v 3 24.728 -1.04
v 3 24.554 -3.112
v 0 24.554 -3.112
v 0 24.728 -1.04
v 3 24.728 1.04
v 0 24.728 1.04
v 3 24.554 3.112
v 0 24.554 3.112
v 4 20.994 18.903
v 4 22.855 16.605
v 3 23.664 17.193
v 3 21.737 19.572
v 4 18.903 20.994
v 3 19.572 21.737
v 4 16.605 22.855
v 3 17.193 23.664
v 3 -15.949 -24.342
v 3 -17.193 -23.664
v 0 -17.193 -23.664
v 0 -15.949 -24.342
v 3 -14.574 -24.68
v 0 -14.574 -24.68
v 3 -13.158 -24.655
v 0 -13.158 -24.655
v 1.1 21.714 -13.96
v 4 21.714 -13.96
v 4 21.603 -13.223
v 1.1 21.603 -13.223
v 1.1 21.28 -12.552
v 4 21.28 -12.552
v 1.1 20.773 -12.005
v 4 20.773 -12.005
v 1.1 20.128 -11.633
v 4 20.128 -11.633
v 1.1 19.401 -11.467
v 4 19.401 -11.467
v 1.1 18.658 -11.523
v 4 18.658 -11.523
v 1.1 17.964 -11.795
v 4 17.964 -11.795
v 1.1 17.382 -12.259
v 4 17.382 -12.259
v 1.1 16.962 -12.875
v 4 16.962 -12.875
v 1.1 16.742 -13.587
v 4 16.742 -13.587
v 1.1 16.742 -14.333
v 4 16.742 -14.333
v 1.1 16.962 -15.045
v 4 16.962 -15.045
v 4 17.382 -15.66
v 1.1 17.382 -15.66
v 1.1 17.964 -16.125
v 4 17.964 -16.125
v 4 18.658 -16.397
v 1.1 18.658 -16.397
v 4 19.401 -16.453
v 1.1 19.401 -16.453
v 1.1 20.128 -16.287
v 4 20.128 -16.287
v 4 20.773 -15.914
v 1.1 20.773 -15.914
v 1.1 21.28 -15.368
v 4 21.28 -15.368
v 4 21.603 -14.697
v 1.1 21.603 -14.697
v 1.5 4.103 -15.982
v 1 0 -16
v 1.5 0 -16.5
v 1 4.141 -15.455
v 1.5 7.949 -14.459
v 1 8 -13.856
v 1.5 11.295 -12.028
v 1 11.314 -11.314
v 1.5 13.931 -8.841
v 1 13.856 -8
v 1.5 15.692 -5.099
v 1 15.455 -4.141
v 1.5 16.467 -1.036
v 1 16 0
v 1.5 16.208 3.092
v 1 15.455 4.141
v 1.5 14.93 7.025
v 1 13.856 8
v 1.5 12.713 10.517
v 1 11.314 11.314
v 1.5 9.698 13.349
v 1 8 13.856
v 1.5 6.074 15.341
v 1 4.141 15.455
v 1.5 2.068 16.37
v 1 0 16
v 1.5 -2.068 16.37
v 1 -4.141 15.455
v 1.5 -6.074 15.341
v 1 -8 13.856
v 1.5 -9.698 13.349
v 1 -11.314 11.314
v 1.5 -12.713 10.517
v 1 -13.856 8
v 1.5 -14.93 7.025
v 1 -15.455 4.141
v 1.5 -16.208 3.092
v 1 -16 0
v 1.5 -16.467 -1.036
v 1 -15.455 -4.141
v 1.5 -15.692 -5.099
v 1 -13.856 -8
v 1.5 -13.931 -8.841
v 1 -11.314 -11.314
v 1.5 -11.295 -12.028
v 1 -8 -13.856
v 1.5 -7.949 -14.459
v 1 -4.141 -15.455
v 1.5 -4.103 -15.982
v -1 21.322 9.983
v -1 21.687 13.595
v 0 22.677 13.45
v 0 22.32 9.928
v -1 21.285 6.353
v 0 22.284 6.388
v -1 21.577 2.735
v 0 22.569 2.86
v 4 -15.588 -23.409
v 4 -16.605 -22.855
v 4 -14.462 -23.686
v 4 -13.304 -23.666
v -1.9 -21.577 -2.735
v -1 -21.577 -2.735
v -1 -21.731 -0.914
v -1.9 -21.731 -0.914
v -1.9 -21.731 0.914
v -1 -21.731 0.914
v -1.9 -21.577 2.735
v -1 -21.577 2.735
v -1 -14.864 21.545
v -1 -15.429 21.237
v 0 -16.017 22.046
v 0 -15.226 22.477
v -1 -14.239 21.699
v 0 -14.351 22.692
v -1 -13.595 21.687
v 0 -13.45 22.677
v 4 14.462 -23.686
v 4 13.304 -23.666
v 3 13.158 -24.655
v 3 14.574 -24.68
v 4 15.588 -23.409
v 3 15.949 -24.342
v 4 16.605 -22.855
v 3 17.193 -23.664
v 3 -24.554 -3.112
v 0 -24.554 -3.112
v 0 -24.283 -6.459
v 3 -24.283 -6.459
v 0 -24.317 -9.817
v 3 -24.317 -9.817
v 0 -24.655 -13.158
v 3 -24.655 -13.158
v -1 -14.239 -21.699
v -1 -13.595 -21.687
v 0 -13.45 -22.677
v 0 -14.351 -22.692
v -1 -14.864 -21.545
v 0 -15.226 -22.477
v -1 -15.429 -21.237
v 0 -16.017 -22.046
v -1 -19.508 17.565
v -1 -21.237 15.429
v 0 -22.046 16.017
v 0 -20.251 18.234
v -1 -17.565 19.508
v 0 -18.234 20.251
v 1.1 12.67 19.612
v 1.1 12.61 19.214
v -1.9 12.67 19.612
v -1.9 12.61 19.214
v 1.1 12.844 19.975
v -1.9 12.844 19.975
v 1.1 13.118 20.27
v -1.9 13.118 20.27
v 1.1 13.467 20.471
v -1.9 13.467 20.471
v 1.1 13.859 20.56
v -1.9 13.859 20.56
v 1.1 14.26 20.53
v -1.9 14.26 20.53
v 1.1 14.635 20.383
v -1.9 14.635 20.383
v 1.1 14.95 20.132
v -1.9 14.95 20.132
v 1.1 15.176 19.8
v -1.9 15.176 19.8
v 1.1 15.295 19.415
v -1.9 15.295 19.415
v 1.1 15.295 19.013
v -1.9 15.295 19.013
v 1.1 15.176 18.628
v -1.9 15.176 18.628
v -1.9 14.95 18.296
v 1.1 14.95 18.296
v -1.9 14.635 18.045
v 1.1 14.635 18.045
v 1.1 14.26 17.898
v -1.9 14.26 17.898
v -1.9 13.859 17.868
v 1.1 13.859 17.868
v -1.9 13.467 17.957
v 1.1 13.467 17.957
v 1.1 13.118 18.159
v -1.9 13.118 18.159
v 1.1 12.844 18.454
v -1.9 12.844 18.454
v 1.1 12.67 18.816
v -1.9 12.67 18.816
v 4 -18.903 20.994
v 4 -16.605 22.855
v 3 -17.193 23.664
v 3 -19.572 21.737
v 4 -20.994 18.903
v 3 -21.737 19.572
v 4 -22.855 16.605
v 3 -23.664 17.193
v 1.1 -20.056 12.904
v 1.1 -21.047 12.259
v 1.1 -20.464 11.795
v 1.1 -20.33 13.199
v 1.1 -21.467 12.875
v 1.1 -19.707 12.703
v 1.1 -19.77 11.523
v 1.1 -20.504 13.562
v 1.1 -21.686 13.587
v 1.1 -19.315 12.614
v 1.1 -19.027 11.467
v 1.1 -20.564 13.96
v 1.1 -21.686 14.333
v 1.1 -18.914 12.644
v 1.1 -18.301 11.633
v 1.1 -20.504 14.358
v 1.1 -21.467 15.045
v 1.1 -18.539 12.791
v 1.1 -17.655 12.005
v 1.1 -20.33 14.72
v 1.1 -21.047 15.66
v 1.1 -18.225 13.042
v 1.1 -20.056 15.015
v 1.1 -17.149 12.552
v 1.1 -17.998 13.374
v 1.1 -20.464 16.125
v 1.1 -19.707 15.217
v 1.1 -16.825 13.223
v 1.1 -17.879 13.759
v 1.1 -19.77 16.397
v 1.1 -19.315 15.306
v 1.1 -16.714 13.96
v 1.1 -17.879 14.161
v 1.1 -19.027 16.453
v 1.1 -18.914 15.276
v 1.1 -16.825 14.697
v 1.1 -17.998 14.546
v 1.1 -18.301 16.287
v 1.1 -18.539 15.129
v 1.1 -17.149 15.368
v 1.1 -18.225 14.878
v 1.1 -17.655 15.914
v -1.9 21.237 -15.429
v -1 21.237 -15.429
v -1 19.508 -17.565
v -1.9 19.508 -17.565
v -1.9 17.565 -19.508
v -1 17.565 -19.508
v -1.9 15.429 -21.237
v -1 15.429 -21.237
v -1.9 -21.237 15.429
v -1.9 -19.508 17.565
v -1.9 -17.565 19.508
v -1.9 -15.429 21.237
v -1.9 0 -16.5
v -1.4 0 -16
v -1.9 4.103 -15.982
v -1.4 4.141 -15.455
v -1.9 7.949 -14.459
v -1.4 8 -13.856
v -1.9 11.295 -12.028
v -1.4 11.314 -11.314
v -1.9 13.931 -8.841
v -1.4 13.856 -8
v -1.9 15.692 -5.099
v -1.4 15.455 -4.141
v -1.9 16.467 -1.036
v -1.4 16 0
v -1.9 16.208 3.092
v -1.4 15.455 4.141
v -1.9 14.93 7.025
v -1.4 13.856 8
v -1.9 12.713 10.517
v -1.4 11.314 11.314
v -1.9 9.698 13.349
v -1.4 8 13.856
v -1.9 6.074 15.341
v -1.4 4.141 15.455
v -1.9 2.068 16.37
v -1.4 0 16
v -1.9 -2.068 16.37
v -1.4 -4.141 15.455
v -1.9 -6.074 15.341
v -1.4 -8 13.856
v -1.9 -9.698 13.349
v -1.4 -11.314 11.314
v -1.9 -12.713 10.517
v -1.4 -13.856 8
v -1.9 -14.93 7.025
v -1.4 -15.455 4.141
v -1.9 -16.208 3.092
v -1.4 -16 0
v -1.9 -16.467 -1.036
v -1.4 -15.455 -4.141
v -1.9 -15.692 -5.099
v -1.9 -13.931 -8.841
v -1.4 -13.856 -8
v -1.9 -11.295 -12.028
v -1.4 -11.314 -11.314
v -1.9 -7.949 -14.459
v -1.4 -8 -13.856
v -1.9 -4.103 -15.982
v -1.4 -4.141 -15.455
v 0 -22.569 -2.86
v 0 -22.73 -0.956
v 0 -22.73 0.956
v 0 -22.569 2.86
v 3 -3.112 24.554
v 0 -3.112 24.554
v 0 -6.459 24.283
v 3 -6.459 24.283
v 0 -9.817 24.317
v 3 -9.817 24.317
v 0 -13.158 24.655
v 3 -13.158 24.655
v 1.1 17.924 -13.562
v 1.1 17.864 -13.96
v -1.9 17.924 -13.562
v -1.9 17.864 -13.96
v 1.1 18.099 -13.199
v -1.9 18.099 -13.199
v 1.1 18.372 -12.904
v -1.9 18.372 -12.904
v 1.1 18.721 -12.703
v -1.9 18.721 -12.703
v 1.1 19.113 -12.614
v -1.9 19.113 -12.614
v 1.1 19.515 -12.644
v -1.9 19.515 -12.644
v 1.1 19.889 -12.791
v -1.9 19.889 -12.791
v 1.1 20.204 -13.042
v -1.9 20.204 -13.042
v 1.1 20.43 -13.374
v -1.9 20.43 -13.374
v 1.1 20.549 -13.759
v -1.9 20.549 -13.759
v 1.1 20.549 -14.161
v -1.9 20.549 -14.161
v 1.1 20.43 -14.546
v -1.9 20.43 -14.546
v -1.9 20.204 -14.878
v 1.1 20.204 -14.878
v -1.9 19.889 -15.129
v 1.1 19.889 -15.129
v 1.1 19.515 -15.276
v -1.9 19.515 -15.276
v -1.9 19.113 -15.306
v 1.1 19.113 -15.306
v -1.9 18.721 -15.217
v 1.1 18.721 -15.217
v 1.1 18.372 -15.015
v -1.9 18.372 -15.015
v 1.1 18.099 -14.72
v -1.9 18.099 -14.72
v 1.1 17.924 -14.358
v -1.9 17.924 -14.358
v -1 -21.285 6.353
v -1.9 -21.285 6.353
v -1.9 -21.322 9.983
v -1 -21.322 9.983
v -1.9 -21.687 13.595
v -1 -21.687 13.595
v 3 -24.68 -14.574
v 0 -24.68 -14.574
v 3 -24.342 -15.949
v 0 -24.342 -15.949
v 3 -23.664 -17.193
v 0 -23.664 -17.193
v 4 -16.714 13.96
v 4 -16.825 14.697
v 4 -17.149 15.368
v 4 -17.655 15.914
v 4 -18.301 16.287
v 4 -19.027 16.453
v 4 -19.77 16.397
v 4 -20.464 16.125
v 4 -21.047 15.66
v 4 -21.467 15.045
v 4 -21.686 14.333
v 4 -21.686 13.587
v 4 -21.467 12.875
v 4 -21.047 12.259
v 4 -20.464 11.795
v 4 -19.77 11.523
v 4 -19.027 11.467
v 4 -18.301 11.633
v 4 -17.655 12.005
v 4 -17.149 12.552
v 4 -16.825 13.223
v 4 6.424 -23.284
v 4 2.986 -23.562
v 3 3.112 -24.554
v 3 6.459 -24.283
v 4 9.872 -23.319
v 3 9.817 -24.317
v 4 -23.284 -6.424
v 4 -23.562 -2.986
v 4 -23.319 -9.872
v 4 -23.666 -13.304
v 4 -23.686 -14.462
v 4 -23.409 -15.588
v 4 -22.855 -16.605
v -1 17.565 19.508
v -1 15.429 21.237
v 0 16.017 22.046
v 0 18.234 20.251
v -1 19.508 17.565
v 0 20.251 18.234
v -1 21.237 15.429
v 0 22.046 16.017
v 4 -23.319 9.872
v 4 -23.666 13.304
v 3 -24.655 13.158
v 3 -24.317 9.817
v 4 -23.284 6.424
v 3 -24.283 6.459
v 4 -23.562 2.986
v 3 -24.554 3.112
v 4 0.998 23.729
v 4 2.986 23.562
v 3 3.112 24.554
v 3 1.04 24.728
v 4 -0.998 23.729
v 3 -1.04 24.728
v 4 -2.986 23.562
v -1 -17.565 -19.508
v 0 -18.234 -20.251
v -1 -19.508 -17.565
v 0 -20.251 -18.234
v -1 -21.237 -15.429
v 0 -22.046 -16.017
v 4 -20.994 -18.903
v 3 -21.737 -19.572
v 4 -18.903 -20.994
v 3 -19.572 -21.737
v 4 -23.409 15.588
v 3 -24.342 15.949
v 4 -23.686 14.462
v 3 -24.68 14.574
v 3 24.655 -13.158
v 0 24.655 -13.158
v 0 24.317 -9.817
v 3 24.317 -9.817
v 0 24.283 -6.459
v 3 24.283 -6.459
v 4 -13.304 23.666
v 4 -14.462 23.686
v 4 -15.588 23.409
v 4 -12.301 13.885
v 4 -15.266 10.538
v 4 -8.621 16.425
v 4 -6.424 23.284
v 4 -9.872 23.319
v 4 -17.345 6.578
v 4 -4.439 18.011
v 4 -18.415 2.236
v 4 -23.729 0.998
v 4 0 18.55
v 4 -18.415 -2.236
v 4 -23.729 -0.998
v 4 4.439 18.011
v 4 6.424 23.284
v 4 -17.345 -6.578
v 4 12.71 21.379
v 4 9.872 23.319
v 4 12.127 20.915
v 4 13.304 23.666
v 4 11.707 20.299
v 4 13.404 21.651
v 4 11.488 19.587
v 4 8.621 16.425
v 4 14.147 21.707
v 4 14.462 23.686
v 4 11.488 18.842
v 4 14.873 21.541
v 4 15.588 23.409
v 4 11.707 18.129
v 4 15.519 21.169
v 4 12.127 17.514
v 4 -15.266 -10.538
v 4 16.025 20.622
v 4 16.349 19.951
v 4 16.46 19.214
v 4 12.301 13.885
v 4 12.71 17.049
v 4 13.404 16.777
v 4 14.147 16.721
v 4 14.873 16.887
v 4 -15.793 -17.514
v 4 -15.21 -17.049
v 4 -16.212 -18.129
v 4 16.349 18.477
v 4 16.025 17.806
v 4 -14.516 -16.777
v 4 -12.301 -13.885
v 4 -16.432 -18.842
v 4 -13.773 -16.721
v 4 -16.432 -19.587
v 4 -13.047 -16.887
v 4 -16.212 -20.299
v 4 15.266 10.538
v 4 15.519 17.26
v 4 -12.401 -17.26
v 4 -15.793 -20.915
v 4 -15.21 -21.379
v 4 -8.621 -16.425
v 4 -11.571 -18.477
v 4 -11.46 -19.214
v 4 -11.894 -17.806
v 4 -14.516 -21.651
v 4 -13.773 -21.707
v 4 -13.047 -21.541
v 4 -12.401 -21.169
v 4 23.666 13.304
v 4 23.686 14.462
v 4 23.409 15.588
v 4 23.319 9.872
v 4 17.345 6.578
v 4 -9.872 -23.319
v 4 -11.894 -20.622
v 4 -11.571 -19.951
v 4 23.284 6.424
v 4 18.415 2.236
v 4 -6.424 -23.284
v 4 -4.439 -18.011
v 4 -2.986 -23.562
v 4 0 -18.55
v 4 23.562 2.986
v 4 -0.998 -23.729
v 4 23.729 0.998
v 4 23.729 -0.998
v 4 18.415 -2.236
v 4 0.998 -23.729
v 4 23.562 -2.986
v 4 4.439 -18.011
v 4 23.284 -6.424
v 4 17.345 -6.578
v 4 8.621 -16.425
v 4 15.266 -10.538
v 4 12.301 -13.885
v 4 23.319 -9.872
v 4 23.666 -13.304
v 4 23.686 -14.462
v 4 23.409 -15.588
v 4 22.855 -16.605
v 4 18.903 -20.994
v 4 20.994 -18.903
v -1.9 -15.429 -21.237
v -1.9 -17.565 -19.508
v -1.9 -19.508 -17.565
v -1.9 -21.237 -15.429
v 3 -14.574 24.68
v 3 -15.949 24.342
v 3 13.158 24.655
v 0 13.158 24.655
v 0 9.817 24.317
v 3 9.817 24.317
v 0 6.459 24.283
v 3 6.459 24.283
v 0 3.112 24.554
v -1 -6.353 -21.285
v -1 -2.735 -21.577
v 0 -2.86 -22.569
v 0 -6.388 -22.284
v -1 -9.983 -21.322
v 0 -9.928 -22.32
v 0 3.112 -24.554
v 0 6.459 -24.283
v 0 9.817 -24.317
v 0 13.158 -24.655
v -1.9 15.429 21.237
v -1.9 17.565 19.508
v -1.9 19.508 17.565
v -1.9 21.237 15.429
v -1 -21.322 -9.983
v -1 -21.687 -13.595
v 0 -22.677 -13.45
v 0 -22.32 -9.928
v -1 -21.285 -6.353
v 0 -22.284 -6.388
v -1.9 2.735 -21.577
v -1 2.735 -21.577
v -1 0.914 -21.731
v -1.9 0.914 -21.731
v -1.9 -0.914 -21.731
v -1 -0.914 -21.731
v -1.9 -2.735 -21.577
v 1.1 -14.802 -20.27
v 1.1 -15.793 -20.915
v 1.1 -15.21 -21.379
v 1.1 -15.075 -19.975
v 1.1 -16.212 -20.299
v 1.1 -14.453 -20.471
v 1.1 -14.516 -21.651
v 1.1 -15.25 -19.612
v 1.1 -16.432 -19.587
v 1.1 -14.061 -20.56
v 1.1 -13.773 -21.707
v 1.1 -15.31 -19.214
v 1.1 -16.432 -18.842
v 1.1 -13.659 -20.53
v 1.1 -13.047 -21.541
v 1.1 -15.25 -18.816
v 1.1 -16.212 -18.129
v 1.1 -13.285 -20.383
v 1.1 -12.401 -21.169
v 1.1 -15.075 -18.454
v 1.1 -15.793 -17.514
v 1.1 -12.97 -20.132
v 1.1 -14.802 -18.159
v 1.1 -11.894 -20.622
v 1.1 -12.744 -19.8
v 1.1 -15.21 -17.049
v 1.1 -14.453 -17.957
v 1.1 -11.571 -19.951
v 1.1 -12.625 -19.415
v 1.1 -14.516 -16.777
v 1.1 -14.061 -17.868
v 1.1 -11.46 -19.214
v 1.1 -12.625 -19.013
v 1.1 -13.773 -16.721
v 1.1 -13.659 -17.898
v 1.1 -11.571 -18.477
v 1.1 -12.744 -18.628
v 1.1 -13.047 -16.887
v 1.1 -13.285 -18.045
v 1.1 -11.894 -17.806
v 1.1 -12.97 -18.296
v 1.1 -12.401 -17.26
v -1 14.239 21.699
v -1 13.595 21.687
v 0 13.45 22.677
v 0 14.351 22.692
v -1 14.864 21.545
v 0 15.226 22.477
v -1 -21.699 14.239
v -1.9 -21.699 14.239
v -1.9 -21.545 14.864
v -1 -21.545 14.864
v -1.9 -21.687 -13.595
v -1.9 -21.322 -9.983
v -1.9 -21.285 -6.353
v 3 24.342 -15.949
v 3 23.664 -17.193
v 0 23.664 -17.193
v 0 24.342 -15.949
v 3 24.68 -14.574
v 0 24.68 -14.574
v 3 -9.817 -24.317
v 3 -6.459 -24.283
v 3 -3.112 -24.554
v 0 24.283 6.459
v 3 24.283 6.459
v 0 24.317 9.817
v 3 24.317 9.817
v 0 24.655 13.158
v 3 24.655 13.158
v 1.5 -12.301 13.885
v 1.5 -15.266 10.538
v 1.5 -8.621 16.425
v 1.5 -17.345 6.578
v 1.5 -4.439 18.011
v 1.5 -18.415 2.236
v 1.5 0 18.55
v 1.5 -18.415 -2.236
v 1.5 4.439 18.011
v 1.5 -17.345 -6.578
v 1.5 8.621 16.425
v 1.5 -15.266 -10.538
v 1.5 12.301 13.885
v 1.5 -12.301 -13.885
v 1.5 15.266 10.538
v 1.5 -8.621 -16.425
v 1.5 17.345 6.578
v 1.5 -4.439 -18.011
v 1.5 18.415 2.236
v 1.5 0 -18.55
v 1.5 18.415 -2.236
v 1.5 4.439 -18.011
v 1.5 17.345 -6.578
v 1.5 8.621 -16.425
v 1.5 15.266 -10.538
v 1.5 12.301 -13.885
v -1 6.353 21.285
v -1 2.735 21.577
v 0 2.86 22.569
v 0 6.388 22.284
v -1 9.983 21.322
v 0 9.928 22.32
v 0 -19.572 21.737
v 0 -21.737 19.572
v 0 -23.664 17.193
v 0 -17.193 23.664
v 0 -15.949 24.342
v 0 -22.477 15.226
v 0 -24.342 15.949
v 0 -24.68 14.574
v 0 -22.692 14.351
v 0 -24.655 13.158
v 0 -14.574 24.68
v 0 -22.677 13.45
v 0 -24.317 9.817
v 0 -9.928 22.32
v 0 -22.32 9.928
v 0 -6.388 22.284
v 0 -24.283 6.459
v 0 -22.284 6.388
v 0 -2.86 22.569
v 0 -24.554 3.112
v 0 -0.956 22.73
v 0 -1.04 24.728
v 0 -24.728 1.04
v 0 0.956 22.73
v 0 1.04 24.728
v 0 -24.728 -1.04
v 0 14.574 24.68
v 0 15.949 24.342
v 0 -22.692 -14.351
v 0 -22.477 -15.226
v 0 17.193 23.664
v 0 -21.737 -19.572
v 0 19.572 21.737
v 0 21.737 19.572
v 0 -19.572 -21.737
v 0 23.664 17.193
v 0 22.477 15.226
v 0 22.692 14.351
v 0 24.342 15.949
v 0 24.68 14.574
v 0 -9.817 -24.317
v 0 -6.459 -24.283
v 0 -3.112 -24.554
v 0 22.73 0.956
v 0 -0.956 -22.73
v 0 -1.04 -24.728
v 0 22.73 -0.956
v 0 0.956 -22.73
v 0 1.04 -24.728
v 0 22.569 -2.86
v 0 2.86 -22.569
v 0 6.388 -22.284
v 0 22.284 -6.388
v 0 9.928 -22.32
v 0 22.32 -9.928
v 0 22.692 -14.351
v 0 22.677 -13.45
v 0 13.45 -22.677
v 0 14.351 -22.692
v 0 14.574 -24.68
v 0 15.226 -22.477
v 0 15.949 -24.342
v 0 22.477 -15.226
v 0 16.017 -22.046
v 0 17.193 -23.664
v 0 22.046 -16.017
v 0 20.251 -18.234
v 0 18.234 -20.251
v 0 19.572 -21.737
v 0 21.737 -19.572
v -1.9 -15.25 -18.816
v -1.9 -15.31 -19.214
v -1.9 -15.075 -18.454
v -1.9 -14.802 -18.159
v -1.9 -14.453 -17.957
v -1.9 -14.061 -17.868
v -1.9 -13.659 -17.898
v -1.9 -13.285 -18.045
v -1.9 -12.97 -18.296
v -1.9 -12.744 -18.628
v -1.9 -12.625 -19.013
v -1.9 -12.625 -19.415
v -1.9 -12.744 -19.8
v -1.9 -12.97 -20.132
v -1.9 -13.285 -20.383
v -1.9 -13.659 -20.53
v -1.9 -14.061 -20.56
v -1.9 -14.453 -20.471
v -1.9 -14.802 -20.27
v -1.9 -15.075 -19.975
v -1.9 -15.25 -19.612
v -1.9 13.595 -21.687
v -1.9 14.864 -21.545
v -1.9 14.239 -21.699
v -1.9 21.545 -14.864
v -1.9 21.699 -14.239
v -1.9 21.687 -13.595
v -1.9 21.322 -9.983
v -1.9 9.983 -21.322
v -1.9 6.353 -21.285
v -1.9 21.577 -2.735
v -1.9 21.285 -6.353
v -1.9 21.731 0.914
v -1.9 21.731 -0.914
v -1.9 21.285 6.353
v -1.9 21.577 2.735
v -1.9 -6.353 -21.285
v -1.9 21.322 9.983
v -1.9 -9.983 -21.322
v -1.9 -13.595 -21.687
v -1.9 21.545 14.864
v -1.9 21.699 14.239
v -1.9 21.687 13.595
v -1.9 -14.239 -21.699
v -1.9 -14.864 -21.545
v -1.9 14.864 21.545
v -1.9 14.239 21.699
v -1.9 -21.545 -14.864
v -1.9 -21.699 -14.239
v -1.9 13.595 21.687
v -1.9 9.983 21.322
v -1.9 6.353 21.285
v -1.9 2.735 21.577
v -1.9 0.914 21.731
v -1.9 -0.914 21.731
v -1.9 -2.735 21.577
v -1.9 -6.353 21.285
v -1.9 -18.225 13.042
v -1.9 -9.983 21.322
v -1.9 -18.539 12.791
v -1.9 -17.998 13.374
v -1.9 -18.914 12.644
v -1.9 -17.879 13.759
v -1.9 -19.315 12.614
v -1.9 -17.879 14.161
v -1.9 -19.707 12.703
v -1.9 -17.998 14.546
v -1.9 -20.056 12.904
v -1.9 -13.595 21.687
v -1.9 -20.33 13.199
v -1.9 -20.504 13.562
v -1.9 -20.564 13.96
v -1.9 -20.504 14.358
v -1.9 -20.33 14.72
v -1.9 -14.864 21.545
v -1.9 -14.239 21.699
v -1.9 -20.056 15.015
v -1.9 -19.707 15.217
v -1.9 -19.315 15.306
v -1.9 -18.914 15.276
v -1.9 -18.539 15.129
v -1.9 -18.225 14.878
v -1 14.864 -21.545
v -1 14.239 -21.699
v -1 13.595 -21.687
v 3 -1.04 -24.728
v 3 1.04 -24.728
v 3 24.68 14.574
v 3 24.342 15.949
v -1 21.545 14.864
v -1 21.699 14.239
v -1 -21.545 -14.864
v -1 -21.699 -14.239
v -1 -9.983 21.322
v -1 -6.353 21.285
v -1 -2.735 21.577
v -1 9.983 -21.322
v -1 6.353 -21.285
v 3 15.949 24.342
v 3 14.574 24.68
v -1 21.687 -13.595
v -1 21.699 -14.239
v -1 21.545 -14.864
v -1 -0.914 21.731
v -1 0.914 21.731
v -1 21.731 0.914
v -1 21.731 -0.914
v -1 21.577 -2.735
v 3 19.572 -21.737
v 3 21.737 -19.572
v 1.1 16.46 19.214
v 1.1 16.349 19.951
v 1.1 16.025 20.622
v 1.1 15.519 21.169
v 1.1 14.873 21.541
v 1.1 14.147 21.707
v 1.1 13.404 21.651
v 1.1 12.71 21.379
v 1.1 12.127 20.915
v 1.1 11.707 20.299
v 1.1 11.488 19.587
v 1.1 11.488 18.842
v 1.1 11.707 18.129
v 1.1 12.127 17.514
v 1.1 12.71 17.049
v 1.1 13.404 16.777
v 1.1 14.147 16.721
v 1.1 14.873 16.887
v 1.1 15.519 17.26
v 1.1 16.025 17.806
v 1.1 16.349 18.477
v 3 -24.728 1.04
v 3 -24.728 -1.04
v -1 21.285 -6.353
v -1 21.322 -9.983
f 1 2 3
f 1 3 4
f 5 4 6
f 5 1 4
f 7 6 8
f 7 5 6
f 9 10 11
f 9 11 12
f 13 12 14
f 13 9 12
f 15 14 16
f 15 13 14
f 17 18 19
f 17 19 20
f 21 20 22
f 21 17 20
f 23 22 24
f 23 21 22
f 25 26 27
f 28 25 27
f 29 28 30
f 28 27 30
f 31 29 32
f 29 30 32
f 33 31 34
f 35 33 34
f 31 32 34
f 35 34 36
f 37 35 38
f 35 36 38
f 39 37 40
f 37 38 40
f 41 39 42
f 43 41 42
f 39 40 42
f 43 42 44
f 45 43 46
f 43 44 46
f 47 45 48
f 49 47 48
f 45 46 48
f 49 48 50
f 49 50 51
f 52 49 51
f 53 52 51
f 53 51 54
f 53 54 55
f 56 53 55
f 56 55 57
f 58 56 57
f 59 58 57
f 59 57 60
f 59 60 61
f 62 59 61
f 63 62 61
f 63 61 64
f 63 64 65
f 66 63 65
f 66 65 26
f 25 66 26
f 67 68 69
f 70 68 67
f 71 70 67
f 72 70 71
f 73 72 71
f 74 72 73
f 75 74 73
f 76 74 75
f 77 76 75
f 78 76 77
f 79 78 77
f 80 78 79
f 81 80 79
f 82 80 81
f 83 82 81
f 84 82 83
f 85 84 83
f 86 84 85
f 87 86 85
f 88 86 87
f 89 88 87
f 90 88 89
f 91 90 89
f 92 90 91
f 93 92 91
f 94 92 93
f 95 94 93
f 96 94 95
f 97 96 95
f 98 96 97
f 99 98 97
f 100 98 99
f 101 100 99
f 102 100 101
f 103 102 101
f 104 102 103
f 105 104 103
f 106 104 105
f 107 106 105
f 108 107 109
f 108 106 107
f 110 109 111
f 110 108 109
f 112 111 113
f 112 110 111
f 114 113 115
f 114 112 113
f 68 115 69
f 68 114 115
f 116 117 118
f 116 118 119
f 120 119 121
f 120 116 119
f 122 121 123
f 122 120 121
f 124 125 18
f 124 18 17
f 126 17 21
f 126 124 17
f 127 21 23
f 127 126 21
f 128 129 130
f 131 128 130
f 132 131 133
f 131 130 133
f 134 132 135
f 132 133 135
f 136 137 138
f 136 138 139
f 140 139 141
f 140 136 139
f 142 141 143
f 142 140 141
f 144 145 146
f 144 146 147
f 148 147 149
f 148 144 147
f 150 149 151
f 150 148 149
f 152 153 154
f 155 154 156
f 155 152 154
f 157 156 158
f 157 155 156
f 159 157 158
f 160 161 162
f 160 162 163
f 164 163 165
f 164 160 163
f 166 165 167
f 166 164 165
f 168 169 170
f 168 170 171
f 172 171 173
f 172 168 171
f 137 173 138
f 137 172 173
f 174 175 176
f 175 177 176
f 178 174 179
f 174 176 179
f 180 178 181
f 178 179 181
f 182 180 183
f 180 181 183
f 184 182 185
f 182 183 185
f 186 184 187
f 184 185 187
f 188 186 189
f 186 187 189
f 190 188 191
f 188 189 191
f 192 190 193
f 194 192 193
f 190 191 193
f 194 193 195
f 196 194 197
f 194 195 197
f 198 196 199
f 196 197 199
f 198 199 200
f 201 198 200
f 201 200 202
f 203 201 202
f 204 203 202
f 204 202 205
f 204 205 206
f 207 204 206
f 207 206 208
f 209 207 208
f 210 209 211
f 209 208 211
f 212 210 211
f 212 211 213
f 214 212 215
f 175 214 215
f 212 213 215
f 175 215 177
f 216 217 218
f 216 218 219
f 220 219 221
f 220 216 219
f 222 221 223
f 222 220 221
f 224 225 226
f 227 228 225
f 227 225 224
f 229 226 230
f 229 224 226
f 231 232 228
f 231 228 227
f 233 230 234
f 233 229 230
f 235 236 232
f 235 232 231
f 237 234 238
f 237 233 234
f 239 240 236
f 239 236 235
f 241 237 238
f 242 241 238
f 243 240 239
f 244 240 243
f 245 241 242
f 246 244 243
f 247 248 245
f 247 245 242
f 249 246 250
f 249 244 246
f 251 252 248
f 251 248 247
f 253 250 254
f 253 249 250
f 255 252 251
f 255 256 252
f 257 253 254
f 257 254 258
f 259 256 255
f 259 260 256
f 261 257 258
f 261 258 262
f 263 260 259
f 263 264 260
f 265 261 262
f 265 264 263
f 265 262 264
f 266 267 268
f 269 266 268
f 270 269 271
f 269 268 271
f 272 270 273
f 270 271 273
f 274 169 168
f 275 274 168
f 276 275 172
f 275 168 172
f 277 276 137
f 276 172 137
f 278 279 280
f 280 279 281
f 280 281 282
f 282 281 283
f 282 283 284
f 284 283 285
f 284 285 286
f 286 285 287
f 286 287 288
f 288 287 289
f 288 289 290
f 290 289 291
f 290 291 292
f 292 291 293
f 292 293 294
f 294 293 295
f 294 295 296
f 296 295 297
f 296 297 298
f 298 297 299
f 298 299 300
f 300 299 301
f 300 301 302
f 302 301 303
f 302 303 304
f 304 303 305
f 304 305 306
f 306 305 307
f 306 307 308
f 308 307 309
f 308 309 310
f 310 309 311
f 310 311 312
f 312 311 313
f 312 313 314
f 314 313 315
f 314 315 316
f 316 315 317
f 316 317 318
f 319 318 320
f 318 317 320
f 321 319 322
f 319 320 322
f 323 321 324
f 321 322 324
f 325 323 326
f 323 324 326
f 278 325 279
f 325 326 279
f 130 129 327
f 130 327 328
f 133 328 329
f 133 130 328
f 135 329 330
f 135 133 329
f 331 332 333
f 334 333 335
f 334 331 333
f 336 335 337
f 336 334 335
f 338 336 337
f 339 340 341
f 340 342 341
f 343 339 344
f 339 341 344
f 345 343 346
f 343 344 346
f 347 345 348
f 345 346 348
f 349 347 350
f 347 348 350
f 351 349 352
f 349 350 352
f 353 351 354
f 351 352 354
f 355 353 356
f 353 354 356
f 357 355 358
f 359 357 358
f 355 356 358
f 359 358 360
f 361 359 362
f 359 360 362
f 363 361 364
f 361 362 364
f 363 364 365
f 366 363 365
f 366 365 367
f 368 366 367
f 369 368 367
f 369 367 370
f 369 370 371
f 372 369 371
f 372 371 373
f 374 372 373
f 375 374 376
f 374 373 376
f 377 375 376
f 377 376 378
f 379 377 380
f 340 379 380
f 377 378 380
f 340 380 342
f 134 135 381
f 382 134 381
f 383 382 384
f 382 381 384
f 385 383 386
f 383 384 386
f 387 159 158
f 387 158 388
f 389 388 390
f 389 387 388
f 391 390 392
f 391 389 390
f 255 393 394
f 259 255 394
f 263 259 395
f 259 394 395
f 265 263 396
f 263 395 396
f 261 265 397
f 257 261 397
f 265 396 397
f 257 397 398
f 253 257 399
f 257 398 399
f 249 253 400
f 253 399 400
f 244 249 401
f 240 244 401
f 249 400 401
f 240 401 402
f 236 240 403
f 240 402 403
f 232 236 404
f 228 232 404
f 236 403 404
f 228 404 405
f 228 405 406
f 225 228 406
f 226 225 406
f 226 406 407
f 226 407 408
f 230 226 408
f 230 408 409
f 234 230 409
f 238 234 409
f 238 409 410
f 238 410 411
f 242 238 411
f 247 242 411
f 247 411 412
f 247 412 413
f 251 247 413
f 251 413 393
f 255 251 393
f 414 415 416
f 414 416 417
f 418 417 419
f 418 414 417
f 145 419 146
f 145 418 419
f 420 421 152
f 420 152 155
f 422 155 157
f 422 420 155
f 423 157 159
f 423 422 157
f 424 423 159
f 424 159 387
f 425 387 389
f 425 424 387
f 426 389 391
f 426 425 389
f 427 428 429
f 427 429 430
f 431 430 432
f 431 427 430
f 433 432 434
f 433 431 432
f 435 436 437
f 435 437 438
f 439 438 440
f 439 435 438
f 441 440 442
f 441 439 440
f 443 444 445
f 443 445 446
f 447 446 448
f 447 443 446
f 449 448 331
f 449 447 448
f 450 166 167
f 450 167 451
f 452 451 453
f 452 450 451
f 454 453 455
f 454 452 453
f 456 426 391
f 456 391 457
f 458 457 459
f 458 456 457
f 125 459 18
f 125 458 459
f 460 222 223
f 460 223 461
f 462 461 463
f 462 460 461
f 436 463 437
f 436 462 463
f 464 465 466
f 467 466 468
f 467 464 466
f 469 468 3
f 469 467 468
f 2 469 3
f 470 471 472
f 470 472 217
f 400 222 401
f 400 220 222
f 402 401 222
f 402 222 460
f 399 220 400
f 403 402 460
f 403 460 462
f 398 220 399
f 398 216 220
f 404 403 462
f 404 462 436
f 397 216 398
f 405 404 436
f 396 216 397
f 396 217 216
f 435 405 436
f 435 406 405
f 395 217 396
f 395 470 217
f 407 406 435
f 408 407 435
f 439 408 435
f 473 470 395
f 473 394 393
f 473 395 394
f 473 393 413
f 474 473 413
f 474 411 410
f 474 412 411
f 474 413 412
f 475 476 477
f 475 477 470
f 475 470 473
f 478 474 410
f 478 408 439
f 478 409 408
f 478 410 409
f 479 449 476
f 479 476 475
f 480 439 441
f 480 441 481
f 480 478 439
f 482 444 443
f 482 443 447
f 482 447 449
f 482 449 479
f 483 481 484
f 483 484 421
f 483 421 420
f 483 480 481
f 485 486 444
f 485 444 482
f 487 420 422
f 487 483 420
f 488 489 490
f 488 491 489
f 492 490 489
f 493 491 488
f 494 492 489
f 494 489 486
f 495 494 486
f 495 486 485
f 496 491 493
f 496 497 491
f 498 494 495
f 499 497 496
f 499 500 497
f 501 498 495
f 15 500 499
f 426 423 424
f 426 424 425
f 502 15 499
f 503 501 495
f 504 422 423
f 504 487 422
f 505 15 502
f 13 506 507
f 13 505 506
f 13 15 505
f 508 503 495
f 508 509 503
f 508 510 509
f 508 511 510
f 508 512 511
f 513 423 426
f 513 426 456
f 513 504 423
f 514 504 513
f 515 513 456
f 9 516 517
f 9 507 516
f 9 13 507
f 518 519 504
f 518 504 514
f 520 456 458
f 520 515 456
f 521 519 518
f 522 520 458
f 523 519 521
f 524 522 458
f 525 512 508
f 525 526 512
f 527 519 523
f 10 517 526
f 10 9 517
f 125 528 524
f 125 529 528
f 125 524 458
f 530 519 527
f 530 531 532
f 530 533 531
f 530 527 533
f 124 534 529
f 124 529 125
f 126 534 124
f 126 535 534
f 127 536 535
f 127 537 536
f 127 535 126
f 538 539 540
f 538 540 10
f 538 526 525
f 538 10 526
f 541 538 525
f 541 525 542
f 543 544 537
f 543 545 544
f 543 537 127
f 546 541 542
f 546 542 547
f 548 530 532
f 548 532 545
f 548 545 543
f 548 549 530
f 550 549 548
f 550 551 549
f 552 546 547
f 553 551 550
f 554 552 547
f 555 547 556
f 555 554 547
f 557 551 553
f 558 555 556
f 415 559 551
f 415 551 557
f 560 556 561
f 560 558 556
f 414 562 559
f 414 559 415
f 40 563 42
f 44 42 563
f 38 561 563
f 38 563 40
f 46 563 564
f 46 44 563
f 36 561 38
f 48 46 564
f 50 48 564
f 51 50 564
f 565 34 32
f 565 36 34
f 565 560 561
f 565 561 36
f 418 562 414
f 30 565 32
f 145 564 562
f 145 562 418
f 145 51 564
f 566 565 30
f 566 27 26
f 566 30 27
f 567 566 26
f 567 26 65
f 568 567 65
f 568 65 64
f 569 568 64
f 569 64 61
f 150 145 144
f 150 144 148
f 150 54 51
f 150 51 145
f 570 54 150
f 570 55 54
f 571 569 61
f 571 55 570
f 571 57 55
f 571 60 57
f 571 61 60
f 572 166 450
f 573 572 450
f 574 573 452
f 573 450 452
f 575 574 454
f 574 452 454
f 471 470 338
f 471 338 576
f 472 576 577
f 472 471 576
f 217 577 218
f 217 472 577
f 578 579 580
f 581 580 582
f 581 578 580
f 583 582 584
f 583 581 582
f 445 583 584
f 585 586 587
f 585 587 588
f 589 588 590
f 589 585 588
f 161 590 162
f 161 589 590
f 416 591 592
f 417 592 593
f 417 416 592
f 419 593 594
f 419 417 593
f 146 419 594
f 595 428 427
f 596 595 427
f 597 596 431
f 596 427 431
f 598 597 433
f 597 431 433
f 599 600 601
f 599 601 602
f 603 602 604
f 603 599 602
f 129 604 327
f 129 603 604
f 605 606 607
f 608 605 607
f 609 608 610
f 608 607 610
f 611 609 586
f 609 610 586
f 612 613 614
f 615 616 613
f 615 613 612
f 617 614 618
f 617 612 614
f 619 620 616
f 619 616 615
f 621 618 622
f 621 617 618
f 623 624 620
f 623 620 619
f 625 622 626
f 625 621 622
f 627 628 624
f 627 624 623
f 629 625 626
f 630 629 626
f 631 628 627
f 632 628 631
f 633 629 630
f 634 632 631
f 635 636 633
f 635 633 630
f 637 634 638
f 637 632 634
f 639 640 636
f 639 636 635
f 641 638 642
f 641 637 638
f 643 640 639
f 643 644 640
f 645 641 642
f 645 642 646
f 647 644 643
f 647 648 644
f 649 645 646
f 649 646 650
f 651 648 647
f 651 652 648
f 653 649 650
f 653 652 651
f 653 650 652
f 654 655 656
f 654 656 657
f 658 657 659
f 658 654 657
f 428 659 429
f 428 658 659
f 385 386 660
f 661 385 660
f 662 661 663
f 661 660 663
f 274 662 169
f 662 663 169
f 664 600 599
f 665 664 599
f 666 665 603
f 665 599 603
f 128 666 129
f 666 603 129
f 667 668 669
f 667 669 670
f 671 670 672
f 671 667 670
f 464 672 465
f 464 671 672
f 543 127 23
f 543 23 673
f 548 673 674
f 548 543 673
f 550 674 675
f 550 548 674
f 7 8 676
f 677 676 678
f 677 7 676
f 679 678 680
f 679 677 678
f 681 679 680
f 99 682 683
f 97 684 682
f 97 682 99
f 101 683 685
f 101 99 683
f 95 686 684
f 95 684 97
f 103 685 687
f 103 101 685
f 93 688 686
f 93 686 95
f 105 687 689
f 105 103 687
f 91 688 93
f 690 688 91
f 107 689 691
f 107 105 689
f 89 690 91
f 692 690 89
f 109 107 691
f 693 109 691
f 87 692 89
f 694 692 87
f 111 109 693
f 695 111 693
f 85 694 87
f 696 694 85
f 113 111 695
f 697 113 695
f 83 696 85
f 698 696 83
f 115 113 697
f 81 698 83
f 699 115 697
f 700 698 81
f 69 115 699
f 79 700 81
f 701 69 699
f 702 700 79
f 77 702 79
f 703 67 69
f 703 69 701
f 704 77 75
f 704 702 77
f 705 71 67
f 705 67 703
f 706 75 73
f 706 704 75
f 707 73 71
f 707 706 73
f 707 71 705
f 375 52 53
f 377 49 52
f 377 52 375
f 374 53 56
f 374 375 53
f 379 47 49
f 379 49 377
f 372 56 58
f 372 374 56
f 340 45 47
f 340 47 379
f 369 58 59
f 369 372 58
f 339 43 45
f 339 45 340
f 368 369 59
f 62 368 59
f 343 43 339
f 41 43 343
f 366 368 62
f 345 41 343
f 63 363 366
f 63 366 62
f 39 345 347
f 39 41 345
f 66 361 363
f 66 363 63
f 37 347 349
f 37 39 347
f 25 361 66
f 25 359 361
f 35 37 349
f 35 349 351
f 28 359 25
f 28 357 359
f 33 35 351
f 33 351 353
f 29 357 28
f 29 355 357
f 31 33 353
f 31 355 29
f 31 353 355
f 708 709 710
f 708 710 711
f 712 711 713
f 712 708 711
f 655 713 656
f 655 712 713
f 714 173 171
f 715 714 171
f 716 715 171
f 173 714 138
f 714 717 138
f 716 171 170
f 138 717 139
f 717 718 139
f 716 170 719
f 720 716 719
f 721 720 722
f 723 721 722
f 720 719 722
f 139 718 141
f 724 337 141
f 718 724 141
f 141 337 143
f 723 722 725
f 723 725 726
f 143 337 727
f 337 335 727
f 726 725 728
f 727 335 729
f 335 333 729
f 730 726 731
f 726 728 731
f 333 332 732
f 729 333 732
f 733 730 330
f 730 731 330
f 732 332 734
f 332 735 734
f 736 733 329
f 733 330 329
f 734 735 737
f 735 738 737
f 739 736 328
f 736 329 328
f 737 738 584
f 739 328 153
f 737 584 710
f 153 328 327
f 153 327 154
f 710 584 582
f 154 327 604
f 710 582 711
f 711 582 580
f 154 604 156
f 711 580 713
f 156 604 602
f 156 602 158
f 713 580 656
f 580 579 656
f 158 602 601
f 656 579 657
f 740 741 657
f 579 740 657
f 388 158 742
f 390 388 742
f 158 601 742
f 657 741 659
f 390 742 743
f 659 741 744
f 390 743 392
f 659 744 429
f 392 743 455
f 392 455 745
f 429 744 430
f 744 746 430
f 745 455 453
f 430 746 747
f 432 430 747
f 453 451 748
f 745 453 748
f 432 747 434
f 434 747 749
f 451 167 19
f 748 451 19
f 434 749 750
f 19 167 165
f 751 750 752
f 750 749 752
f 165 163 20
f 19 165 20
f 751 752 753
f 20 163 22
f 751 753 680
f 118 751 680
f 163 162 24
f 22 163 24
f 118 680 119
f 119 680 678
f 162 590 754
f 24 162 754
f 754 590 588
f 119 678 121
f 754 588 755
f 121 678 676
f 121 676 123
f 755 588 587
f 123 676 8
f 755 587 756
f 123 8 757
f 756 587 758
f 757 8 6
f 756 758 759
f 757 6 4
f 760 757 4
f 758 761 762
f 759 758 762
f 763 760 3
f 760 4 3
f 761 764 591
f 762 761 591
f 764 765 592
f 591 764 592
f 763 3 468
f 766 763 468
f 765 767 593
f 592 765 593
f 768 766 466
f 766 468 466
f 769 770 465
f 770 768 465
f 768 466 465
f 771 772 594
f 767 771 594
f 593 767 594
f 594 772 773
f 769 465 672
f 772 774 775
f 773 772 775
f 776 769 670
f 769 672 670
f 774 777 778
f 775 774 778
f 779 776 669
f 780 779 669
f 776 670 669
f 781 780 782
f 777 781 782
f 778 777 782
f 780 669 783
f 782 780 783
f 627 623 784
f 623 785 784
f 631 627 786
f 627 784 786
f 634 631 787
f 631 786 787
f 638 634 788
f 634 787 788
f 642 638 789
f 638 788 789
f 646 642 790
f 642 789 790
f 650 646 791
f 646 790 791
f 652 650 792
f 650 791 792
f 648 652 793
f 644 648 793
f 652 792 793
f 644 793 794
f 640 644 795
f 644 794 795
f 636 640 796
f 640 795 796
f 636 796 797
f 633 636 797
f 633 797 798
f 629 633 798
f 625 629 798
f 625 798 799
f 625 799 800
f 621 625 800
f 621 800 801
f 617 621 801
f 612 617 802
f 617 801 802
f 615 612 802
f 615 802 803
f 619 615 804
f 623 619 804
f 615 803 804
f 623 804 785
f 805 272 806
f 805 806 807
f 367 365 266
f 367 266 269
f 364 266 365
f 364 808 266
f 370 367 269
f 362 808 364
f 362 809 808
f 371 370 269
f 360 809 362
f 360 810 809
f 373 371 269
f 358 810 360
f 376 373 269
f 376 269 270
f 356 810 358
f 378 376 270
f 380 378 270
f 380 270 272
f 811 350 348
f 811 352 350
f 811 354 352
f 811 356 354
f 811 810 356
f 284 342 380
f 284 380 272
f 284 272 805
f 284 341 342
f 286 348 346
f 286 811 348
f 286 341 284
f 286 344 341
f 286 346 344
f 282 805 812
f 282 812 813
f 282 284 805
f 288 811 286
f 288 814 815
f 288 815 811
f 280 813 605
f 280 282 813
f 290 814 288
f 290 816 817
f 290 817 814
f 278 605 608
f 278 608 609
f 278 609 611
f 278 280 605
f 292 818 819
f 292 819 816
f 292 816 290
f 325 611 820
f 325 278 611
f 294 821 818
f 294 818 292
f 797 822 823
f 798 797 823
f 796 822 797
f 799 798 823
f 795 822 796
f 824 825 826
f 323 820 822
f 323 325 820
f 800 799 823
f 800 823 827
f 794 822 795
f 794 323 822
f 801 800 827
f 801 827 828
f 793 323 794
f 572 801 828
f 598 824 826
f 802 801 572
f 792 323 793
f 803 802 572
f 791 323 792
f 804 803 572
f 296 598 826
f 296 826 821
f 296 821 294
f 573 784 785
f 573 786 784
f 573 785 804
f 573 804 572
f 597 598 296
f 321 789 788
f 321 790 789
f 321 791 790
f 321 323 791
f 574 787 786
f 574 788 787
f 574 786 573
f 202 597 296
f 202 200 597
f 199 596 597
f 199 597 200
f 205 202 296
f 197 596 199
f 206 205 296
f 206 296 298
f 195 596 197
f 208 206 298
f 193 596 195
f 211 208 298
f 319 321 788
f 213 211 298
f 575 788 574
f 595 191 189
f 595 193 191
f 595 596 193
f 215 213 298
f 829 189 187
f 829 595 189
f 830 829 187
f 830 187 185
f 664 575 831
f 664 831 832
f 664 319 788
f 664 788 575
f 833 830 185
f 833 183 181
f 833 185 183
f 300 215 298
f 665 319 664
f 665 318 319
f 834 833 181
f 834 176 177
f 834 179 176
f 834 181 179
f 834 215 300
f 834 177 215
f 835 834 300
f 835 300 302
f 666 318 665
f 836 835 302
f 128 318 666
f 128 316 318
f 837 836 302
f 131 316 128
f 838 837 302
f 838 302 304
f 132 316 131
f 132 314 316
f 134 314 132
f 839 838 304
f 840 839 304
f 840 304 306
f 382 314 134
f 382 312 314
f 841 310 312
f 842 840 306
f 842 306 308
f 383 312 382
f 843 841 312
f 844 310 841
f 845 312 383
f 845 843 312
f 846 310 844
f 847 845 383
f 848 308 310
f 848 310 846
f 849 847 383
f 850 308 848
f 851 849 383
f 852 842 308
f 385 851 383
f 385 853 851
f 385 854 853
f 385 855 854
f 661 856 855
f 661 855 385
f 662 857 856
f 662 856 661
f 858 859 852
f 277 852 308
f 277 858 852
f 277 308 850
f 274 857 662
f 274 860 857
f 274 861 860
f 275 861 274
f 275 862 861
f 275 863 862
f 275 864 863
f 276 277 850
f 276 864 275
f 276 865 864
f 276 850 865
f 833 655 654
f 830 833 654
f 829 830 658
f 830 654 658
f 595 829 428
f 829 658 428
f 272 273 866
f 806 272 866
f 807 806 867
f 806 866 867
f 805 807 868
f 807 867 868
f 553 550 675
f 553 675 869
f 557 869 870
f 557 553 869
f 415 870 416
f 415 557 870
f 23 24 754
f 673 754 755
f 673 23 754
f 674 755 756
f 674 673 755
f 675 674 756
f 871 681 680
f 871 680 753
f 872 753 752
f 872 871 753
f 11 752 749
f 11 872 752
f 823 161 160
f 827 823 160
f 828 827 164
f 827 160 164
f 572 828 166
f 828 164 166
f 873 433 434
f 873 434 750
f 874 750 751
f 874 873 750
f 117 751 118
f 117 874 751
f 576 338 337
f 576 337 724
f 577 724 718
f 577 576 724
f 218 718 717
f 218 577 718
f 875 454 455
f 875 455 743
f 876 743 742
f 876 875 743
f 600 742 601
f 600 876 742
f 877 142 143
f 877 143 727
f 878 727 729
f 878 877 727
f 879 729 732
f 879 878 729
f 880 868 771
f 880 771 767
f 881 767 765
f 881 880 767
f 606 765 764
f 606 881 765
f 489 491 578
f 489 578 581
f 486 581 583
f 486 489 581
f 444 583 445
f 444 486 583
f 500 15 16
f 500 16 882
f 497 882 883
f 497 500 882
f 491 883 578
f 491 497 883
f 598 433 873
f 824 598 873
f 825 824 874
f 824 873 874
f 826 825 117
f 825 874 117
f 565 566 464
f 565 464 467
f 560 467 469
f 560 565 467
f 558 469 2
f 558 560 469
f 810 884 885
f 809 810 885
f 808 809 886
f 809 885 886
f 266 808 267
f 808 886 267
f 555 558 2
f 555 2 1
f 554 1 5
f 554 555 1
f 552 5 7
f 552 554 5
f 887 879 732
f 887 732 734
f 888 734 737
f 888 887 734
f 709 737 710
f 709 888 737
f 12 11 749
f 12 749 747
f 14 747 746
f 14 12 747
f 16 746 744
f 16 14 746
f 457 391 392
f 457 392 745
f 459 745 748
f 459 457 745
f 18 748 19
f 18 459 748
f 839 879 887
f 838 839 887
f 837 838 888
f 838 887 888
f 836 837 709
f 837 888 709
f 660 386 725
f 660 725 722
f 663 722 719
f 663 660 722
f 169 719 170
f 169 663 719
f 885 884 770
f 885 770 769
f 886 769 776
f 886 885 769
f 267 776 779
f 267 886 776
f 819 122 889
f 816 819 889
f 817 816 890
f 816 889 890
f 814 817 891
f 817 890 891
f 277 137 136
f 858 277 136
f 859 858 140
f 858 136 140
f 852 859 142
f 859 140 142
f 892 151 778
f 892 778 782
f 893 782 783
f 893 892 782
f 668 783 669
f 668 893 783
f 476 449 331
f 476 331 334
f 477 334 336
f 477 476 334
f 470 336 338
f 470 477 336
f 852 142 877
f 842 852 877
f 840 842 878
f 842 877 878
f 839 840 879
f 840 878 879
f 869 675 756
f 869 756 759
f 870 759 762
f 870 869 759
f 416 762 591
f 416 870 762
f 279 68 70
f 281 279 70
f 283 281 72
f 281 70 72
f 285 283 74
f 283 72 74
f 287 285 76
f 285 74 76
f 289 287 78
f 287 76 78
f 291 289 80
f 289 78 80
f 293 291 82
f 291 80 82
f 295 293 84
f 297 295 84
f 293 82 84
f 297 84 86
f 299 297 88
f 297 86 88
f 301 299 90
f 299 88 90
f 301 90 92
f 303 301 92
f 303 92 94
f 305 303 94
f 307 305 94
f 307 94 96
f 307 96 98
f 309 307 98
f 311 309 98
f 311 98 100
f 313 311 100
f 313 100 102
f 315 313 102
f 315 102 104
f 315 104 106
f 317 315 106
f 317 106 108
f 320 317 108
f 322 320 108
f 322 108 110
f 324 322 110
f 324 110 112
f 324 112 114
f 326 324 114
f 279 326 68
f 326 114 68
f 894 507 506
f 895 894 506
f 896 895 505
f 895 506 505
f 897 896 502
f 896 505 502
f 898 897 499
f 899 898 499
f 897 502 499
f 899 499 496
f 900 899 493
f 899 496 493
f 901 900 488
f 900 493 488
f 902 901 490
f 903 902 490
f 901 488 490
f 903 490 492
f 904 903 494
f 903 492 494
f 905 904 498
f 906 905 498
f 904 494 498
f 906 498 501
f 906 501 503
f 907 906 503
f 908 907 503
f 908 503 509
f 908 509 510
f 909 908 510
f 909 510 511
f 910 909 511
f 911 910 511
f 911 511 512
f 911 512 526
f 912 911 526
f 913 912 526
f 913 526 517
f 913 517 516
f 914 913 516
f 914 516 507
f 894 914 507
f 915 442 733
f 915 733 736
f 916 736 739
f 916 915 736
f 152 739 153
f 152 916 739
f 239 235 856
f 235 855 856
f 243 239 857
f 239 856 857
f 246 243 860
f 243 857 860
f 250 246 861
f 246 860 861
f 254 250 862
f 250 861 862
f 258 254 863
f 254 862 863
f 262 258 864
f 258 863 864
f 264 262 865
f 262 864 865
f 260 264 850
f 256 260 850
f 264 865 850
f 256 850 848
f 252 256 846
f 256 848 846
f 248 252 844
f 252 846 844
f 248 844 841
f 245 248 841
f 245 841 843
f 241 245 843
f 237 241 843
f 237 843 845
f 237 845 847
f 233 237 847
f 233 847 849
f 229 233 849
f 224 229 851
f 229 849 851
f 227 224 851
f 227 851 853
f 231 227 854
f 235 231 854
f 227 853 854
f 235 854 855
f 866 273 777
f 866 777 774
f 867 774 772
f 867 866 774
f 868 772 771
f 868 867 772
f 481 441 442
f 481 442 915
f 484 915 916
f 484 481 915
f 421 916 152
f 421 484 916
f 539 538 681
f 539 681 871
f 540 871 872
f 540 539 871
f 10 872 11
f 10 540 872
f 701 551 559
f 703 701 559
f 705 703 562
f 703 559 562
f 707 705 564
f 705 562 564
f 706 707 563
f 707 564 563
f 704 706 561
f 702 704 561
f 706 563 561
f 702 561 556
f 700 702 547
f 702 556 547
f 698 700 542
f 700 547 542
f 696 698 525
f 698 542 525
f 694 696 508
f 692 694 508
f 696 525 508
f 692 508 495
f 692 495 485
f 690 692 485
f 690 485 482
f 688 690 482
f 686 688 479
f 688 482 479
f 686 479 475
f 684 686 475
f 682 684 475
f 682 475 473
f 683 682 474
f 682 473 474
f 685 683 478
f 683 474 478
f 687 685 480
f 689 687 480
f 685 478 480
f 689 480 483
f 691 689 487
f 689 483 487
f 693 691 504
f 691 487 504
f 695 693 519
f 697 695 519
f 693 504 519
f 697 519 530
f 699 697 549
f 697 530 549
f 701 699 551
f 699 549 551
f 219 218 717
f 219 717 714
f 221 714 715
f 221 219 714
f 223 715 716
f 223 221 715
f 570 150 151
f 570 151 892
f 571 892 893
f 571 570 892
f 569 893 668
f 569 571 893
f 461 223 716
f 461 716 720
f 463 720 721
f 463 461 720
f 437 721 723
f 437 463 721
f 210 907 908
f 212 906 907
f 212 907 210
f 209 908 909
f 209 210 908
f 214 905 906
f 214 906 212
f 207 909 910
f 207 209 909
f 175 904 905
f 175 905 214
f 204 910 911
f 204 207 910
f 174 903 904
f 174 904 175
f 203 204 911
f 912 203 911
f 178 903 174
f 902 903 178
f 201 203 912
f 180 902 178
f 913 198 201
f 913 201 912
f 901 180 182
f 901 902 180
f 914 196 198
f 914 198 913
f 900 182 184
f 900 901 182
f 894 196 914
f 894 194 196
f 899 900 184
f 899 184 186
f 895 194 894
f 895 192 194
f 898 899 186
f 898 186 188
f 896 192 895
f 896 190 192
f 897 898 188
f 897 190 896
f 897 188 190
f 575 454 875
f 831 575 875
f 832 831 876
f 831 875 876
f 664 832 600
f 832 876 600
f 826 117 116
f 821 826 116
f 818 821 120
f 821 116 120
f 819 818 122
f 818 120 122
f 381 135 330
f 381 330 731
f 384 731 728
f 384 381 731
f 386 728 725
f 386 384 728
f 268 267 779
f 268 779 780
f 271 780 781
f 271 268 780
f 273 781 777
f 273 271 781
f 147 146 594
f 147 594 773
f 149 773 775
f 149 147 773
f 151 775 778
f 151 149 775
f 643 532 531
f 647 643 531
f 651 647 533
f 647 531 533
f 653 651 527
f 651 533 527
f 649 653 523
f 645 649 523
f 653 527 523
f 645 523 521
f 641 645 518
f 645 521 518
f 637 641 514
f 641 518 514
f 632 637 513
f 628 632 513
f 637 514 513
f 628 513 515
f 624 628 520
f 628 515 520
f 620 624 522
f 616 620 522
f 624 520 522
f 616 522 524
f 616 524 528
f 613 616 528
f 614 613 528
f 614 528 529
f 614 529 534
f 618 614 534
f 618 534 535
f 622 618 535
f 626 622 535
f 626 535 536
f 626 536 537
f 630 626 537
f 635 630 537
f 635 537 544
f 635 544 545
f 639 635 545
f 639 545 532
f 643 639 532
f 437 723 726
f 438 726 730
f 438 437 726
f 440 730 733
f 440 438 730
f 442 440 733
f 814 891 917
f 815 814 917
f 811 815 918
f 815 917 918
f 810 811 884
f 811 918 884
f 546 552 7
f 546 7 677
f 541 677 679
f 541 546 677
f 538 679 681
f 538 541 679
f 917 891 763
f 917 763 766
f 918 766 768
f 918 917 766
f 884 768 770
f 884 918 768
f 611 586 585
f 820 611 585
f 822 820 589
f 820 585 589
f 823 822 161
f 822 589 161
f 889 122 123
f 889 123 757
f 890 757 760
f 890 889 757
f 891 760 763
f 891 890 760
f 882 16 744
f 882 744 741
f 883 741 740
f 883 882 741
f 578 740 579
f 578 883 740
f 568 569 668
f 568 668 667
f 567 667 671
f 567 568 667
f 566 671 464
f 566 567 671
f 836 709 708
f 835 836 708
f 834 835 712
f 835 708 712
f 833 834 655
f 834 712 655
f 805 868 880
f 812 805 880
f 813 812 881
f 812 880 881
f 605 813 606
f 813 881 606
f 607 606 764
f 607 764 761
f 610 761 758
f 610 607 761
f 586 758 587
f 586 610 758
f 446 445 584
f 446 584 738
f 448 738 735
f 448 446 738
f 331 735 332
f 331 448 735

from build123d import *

# Parameters (mm, degrees)
SKETCH_1_R                     = 30
EXTRUDE_1_DEPTH                = 4
EXTRUDE_2_DEPTH                = 1.9
CHAMFER_1_SIZE                 = 1
SKETCH_5_R                     = 16
CUT_EXTRUDE_2_DEPTH            = 43.83468221
HOLE_WIZARD_M2_5_1_D           = 2.7
HOLE_WIZARD_M2_5_1_CBORE_D     = 5
HOLE_WIZARD_M2_5_1_CBORE_DEPTH = 2.9
SKETCH_8_OUTSIDE_W             = 79.012
SKETCH_8_OUTSIDE_H             = 79.012
CUT_EXTRUDE_3_DEPTH            = 43.83468221
CHAMFER_2_SIZE                 = 1
SKETCH_9_R                     = 18.55
CUT_EXTRUDE_4_DEPTH            = 2.5
CHAMFER_3_SIZE                 = 0.5


with BuildPart() as part:
    # 草图1 → 凸台-拉伸1 (new body)
    with BuildSketch(Plane.YZ):
        with Locations(Location((0, 0, 0), (0, 0, 270))):
            Circle(SKETCH_1_R)
    extrude(amount=EXTRUDE_1_DEPTH)

    # 草图2 → 凸台-拉伸2 (add)
    with BuildSketch(Plane(origin=(0, 0, 0), x_dir=(0, -1, 0), z_dir=(-1, 0, 0))):
        with BuildLine():
            ThreePointArc((-15.429362873, -21.236696102), (-14.556584324, -21.641903091), (-13.595407183, -21.687439927))
            ThreePointArc((-13.595407183, -21.687439927), (-8.168716079, -21.262073185), (-2.734521388, -21.577416267))
            ThreePointArc((-2.734521388, -21.577416267), (0, -21.75), (2.734521388, -21.577416267))
            ThreePointArc((2.734521388, -21.577416267), (8.168716079, -21.262073185), (13.595407183, -21.687439927))
            ThreePointArc((13.595407183, -21.687439927), (14.556584324, -21.641903091), (15.429362873, -21.236696102))
            ThreePointArc((15.429362873, -21.236696102), (18.561553006, -18.561553006), (21.236696102, -15.429362873))
            ThreePointArc((21.236696102, -15.429362873), (21.641903091, -14.556584324), (21.687439927, -13.595407183))
            ThreePointArc((21.687439927, -13.595407183), (21.262073185, -8.168716079), (21.577416267, -2.734521388))
            ThreePointArc((21.577416267, -2.734521388), (21.75, 0), (21.577416267, 2.734521388))
            ThreePointArc((21.577416267, 2.734521388), (21.262073185, 8.168716079), (21.687439927, 13.595407183))
            ThreePointArc((21.687439927, 13.595407183), (21.641903091, 14.556584324), (21.236696102, 15.429362873))
            ThreePointArc((21.236696102, 15.429362873), (18.561553006, 18.561553006), (15.429362873, 21.236696102))
            ThreePointArc((15.429362873, 21.236696102), (14.556584324, 21.641903091), (13.595407183, 21.687439927))
            ThreePointArc((13.595407183, 21.687439927), (8.168716079, 21.262073185), (2.734521388, 21.577416267))
            ThreePointArc((2.734521388, 21.577416267), (0, 21.75), (-2.734521388, 21.577416267))
            ThreePointArc((-2.734521388, 21.577416267), (-8.168716079, 21.262073185), (-13.595407183, 21.687439927))
            ThreePointArc((-13.595407183, 21.687439927), (-14.556584324, 21.641903091), (-15.429362873, 21.236696102))
            ThreePointArc((-15.429362873, 21.236696102), (-18.561553006, 18.561553006), (-21.236696102, 15.429362873))
            ThreePointArc((-21.236696102, 15.429362873), (-21.641903091, 14.556584324), (-21.687439927, 13.595407183))
            ThreePointArc((-21.687439927, 13.595407183), (-21.262073185, 8.168716079), (-21.577416267, 2.734521388))
            ThreePointArc((-21.577416267, 2.734521388), (-21.75, 0), (-21.577416267, -2.734521388))
            ThreePointArc((-21.577416267, -2.734521388), (-21.262073185, -8.168716079), (-21.687439927, -13.595407183))
            ThreePointArc((-21.687439927, -13.595407183), (-21.641903091, -14.556584324), (-21.236696102, -15.429362873))
            ThreePointArc((-21.236696102, -15.429362873), (-18.561553006, -18.561553006), (-15.429362873, -21.236696102))
        make_face()
    extrude(amount=EXTRUDE_2_DEPTH)

    # 倒角1
    chamfer_1_edges = [part.edges().sort_by_distance(p)[0] for p in [
        (0, 21.641903091, -14.556584324),
        (0, 18.561553006, -18.561553006),
        (0, 14.556584324, -21.641903091),
        (0, 8.168716079, -21.262073185),
        (0, 0, -21.75),
        (0, -8.168716079, -21.262073185),
        (0, -14.556584324, -21.641903091),
        (0, -18.561553006, -18.561553006),
        (0, -21.641903091, -14.556584324),
        (0, -21.262073185, -8.168716079),
        (0, -21.75, 0),
        (0, -21.262073185, 8.168716079),
        (0, -21.641903091, 14.556584324),
        (0, -18.561553006, 18.561553006),
        (0, -14.556584324, 21.641903091),
        (0, -8.168716079, 21.262073185),
        (0, 0, 21.75),
        (0, 8.168716079, 21.262073185),
        (0, 14.556584324, 21.641903091),
        (0, 18.561553006, 18.561553006),
        (0, 21.641903091, 14.556584324),
        (0, 21.262073185, 8.168716079),
        (0, 21.75, 0),
        (0, 21.262073185, -8.168716079),
    ]]
    chamfer(chamfer_1_edges, length=CHAMFER_1_SIZE)

    # 草图5 → 切除-拉伸2 (cut, through all)
    with BuildSketch(Plane.YZ.offset(4)):
        with Locations(Location((0, 0, 0), (0, 0, 270))):
            Circle(SKETCH_5_R)
    extrude(amount=-CUT_EXTRUDE_2_DEPTH, mode=Mode.SUBTRACT)

    # M2.5 六角圆柱头螺钉的柱形沉头孔1 (through all)
    with Locations(Plane.YZ.offset(4)):
        with Locations((-19.214153616, 13.959899742), (13.959899742, 19.214153616), (19.214153616, -13.959899742), (-13.959899742, -19.214153616)):
            CounterBoreHole(HOLE_WIZARD_M2_5_1_D / 2, HOLE_WIZARD_M2_5_1_CBORE_D / 2, HOLE_WIZARD_M2_5_1_CBORE_DEPTH)

    # 草图8 outside → 切除-拉伸3 (cut, through all)
    with BuildSketch(Plane(origin=(4, 0, 0), x_dir=(0, 0, -1), z_dir=(1, 0, 0))):
        Rectangle(SKETCH_8_OUTSIDE_W, SKETCH_8_OUTSIDE_H)
        with BuildLine():
            ThreePointArc((-3.111696751, 24.553611615), (-8.138326841, 24.261919263), (-13.158016112, 24.6553835))
            ThreePointArc((-13.158016112, 24.6553835), (-15.272605822, 24.55520246), (-17.19271863, 23.663747085))
            ThreePointArc((-17.19271863, 23.663747085), (-20.68287335, 20.68287335), (-23.663747085, 17.19271863))
            ThreePointArc((-23.663747085, 17.19271863), (-24.55520246, 15.272605822), (-24.6553835, 13.158016112))
            ThreePointArc((-24.6553835, 13.158016112), (-24.261919263, 8.138326841), (-24.553611615, 3.111696751))
            ThreePointArc((-24.553611615, 3.111696751), (-24.75, 0), (-24.553611615, -3.111696751))
            ThreePointArc((-24.553611615, -3.111696751), (-24.261919263, -8.138326841), (-24.6553835, -13.158016112))
            ThreePointArc((-24.6553835, -13.158016112), (-24.55520246, -15.272605822), (-23.663747085, -17.19271863))
            ThreePointArc((-23.663747085, -17.19271863), (-20.68287335, -20.68287335), (-17.19271863, -23.663747085))
            ThreePointArc((-17.19271863, -23.663747085), (-15.272605822, -24.55520246), (-13.158016112, -24.6553835))
            ThreePointArc((-13.158016112, -24.6553835), (-8.138326841, -24.261919263), (-3.111696751, -24.553611615))
            ThreePointArc((-3.111696751, -24.553611615), (0, -24.75), (3.111696751, -24.553611615))
            ThreePointArc((3.111696751, -24.553611615), (8.138326841, -24.261919263), (13.158016112, -24.6553835))
            ThreePointArc((13.158016112, -24.6553835), (15.272605822, -24.55520246), (17.19271863, -23.663747085))
            ThreePointArc((17.19271863, -23.663747085), (20.68287335, -20.68287335), (23.663747085, -17.19271863))
            ThreePointArc((23.663747085, -17.19271863), (24.55520246, -15.272605822), (24.6553835, -13.158016112))
            ThreePointArc((24.6553835, -13.158016112), (24.261919263, -8.138326841), (24.553611615, -3.111696751))
            ThreePointArc((24.553611615, -3.111696751), (24.75, 0), (24.553611615, 3.111696751))
            ThreePointArc((24.553611615, 3.111696751), (24.261919263, 8.138326841), (24.6553835, 13.158016112))
            ThreePointArc((24.6553835, 13.158016112), (24.55520246, 15.272605822), (23.663747085, 17.19271863))
            ThreePointArc((23.663747085, 17.19271863), (20.68287335, 20.68287335), (17.19271863, 23.663747085))
            ThreePointArc((17.19271863, 23.663747085), (15.272605822, 24.55520246), (13.158016112, 24.6553835))
            ThreePointArc((13.158016112, 24.6553835), (8.138326841, 24.261919263), (3.111696751, 24.553611615))
            ThreePointArc((3.111696751, 24.553611615), (0, 24.75), (-3.111696751, 24.553611615))
        make_face(mode=Mode.SUBTRACT)
    extrude(amount=-CUT_EXTRUDE_3_DEPTH, mode=Mode.SUBTRACT)

    # 倒角2
    chamfer_2_edges = [part.edges().sort_by_distance(p)[0] for p in [
        (4, 24.75, 0),
        (4, 24.261919263, -8.138326841),
        (4, 24.55520246, -15.272605822),
        (4, 20.68287335, -20.68287335),
        (4, 15.272605822, -24.55520246),
        (4, 8.138326841, -24.261919263),
        (4, 0, -24.75),
        (4, -8.138326841, -24.261919263),
        (4, -15.272605822, -24.55520246),
        (4, -20.68287335, -20.68287335),
        (4, -24.55520246, -15.272605822),
        (4, -24.261919263, -8.138326841),
        (4, -24.75, 0),
        (4, -24.261919263, 8.138326841),
        (4, -24.55520246, 15.272605822),
        (4, -20.68287335, 20.68287335),
        (4, -15.272605822, 24.55520246),
        (4, -8.138326841, 24.261919263),
        (4, 0, 24.75),
        (4, 8.138326841, 24.261919263),
        (4, 15.272605822, 24.55520246),
        (4, 20.68287335, 20.68287335),
        (4, 24.55520246, 15.272605822),
        (4, 24.261919263, 8.138326841),
    ]]
    chamfer(chamfer_2_edges, length=CHAMFER_2_SIZE)

    # 草图9 → 切除-拉伸4 (cut)
    with BuildSketch(Plane(origin=(4, 0, 0), x_dir=(0, 0, -1), z_dir=(1, 0, 0))):
        Circle(SKETCH_9_R)
    extrude(amount=-CUT_EXTRUDE_4_DEPTH, mode=Mode.SUBTRACT)

    # 倒角3
    chamfer_3_edges = [part.edges().sort_by_distance(p)[0] for p in [
        (-1.9, 0, 16),
        (1.5, 0, 16),
    ]]
    chamfer(chamfer_3_edges, length=CHAMFER_3_SIZE)


solid = part.part
